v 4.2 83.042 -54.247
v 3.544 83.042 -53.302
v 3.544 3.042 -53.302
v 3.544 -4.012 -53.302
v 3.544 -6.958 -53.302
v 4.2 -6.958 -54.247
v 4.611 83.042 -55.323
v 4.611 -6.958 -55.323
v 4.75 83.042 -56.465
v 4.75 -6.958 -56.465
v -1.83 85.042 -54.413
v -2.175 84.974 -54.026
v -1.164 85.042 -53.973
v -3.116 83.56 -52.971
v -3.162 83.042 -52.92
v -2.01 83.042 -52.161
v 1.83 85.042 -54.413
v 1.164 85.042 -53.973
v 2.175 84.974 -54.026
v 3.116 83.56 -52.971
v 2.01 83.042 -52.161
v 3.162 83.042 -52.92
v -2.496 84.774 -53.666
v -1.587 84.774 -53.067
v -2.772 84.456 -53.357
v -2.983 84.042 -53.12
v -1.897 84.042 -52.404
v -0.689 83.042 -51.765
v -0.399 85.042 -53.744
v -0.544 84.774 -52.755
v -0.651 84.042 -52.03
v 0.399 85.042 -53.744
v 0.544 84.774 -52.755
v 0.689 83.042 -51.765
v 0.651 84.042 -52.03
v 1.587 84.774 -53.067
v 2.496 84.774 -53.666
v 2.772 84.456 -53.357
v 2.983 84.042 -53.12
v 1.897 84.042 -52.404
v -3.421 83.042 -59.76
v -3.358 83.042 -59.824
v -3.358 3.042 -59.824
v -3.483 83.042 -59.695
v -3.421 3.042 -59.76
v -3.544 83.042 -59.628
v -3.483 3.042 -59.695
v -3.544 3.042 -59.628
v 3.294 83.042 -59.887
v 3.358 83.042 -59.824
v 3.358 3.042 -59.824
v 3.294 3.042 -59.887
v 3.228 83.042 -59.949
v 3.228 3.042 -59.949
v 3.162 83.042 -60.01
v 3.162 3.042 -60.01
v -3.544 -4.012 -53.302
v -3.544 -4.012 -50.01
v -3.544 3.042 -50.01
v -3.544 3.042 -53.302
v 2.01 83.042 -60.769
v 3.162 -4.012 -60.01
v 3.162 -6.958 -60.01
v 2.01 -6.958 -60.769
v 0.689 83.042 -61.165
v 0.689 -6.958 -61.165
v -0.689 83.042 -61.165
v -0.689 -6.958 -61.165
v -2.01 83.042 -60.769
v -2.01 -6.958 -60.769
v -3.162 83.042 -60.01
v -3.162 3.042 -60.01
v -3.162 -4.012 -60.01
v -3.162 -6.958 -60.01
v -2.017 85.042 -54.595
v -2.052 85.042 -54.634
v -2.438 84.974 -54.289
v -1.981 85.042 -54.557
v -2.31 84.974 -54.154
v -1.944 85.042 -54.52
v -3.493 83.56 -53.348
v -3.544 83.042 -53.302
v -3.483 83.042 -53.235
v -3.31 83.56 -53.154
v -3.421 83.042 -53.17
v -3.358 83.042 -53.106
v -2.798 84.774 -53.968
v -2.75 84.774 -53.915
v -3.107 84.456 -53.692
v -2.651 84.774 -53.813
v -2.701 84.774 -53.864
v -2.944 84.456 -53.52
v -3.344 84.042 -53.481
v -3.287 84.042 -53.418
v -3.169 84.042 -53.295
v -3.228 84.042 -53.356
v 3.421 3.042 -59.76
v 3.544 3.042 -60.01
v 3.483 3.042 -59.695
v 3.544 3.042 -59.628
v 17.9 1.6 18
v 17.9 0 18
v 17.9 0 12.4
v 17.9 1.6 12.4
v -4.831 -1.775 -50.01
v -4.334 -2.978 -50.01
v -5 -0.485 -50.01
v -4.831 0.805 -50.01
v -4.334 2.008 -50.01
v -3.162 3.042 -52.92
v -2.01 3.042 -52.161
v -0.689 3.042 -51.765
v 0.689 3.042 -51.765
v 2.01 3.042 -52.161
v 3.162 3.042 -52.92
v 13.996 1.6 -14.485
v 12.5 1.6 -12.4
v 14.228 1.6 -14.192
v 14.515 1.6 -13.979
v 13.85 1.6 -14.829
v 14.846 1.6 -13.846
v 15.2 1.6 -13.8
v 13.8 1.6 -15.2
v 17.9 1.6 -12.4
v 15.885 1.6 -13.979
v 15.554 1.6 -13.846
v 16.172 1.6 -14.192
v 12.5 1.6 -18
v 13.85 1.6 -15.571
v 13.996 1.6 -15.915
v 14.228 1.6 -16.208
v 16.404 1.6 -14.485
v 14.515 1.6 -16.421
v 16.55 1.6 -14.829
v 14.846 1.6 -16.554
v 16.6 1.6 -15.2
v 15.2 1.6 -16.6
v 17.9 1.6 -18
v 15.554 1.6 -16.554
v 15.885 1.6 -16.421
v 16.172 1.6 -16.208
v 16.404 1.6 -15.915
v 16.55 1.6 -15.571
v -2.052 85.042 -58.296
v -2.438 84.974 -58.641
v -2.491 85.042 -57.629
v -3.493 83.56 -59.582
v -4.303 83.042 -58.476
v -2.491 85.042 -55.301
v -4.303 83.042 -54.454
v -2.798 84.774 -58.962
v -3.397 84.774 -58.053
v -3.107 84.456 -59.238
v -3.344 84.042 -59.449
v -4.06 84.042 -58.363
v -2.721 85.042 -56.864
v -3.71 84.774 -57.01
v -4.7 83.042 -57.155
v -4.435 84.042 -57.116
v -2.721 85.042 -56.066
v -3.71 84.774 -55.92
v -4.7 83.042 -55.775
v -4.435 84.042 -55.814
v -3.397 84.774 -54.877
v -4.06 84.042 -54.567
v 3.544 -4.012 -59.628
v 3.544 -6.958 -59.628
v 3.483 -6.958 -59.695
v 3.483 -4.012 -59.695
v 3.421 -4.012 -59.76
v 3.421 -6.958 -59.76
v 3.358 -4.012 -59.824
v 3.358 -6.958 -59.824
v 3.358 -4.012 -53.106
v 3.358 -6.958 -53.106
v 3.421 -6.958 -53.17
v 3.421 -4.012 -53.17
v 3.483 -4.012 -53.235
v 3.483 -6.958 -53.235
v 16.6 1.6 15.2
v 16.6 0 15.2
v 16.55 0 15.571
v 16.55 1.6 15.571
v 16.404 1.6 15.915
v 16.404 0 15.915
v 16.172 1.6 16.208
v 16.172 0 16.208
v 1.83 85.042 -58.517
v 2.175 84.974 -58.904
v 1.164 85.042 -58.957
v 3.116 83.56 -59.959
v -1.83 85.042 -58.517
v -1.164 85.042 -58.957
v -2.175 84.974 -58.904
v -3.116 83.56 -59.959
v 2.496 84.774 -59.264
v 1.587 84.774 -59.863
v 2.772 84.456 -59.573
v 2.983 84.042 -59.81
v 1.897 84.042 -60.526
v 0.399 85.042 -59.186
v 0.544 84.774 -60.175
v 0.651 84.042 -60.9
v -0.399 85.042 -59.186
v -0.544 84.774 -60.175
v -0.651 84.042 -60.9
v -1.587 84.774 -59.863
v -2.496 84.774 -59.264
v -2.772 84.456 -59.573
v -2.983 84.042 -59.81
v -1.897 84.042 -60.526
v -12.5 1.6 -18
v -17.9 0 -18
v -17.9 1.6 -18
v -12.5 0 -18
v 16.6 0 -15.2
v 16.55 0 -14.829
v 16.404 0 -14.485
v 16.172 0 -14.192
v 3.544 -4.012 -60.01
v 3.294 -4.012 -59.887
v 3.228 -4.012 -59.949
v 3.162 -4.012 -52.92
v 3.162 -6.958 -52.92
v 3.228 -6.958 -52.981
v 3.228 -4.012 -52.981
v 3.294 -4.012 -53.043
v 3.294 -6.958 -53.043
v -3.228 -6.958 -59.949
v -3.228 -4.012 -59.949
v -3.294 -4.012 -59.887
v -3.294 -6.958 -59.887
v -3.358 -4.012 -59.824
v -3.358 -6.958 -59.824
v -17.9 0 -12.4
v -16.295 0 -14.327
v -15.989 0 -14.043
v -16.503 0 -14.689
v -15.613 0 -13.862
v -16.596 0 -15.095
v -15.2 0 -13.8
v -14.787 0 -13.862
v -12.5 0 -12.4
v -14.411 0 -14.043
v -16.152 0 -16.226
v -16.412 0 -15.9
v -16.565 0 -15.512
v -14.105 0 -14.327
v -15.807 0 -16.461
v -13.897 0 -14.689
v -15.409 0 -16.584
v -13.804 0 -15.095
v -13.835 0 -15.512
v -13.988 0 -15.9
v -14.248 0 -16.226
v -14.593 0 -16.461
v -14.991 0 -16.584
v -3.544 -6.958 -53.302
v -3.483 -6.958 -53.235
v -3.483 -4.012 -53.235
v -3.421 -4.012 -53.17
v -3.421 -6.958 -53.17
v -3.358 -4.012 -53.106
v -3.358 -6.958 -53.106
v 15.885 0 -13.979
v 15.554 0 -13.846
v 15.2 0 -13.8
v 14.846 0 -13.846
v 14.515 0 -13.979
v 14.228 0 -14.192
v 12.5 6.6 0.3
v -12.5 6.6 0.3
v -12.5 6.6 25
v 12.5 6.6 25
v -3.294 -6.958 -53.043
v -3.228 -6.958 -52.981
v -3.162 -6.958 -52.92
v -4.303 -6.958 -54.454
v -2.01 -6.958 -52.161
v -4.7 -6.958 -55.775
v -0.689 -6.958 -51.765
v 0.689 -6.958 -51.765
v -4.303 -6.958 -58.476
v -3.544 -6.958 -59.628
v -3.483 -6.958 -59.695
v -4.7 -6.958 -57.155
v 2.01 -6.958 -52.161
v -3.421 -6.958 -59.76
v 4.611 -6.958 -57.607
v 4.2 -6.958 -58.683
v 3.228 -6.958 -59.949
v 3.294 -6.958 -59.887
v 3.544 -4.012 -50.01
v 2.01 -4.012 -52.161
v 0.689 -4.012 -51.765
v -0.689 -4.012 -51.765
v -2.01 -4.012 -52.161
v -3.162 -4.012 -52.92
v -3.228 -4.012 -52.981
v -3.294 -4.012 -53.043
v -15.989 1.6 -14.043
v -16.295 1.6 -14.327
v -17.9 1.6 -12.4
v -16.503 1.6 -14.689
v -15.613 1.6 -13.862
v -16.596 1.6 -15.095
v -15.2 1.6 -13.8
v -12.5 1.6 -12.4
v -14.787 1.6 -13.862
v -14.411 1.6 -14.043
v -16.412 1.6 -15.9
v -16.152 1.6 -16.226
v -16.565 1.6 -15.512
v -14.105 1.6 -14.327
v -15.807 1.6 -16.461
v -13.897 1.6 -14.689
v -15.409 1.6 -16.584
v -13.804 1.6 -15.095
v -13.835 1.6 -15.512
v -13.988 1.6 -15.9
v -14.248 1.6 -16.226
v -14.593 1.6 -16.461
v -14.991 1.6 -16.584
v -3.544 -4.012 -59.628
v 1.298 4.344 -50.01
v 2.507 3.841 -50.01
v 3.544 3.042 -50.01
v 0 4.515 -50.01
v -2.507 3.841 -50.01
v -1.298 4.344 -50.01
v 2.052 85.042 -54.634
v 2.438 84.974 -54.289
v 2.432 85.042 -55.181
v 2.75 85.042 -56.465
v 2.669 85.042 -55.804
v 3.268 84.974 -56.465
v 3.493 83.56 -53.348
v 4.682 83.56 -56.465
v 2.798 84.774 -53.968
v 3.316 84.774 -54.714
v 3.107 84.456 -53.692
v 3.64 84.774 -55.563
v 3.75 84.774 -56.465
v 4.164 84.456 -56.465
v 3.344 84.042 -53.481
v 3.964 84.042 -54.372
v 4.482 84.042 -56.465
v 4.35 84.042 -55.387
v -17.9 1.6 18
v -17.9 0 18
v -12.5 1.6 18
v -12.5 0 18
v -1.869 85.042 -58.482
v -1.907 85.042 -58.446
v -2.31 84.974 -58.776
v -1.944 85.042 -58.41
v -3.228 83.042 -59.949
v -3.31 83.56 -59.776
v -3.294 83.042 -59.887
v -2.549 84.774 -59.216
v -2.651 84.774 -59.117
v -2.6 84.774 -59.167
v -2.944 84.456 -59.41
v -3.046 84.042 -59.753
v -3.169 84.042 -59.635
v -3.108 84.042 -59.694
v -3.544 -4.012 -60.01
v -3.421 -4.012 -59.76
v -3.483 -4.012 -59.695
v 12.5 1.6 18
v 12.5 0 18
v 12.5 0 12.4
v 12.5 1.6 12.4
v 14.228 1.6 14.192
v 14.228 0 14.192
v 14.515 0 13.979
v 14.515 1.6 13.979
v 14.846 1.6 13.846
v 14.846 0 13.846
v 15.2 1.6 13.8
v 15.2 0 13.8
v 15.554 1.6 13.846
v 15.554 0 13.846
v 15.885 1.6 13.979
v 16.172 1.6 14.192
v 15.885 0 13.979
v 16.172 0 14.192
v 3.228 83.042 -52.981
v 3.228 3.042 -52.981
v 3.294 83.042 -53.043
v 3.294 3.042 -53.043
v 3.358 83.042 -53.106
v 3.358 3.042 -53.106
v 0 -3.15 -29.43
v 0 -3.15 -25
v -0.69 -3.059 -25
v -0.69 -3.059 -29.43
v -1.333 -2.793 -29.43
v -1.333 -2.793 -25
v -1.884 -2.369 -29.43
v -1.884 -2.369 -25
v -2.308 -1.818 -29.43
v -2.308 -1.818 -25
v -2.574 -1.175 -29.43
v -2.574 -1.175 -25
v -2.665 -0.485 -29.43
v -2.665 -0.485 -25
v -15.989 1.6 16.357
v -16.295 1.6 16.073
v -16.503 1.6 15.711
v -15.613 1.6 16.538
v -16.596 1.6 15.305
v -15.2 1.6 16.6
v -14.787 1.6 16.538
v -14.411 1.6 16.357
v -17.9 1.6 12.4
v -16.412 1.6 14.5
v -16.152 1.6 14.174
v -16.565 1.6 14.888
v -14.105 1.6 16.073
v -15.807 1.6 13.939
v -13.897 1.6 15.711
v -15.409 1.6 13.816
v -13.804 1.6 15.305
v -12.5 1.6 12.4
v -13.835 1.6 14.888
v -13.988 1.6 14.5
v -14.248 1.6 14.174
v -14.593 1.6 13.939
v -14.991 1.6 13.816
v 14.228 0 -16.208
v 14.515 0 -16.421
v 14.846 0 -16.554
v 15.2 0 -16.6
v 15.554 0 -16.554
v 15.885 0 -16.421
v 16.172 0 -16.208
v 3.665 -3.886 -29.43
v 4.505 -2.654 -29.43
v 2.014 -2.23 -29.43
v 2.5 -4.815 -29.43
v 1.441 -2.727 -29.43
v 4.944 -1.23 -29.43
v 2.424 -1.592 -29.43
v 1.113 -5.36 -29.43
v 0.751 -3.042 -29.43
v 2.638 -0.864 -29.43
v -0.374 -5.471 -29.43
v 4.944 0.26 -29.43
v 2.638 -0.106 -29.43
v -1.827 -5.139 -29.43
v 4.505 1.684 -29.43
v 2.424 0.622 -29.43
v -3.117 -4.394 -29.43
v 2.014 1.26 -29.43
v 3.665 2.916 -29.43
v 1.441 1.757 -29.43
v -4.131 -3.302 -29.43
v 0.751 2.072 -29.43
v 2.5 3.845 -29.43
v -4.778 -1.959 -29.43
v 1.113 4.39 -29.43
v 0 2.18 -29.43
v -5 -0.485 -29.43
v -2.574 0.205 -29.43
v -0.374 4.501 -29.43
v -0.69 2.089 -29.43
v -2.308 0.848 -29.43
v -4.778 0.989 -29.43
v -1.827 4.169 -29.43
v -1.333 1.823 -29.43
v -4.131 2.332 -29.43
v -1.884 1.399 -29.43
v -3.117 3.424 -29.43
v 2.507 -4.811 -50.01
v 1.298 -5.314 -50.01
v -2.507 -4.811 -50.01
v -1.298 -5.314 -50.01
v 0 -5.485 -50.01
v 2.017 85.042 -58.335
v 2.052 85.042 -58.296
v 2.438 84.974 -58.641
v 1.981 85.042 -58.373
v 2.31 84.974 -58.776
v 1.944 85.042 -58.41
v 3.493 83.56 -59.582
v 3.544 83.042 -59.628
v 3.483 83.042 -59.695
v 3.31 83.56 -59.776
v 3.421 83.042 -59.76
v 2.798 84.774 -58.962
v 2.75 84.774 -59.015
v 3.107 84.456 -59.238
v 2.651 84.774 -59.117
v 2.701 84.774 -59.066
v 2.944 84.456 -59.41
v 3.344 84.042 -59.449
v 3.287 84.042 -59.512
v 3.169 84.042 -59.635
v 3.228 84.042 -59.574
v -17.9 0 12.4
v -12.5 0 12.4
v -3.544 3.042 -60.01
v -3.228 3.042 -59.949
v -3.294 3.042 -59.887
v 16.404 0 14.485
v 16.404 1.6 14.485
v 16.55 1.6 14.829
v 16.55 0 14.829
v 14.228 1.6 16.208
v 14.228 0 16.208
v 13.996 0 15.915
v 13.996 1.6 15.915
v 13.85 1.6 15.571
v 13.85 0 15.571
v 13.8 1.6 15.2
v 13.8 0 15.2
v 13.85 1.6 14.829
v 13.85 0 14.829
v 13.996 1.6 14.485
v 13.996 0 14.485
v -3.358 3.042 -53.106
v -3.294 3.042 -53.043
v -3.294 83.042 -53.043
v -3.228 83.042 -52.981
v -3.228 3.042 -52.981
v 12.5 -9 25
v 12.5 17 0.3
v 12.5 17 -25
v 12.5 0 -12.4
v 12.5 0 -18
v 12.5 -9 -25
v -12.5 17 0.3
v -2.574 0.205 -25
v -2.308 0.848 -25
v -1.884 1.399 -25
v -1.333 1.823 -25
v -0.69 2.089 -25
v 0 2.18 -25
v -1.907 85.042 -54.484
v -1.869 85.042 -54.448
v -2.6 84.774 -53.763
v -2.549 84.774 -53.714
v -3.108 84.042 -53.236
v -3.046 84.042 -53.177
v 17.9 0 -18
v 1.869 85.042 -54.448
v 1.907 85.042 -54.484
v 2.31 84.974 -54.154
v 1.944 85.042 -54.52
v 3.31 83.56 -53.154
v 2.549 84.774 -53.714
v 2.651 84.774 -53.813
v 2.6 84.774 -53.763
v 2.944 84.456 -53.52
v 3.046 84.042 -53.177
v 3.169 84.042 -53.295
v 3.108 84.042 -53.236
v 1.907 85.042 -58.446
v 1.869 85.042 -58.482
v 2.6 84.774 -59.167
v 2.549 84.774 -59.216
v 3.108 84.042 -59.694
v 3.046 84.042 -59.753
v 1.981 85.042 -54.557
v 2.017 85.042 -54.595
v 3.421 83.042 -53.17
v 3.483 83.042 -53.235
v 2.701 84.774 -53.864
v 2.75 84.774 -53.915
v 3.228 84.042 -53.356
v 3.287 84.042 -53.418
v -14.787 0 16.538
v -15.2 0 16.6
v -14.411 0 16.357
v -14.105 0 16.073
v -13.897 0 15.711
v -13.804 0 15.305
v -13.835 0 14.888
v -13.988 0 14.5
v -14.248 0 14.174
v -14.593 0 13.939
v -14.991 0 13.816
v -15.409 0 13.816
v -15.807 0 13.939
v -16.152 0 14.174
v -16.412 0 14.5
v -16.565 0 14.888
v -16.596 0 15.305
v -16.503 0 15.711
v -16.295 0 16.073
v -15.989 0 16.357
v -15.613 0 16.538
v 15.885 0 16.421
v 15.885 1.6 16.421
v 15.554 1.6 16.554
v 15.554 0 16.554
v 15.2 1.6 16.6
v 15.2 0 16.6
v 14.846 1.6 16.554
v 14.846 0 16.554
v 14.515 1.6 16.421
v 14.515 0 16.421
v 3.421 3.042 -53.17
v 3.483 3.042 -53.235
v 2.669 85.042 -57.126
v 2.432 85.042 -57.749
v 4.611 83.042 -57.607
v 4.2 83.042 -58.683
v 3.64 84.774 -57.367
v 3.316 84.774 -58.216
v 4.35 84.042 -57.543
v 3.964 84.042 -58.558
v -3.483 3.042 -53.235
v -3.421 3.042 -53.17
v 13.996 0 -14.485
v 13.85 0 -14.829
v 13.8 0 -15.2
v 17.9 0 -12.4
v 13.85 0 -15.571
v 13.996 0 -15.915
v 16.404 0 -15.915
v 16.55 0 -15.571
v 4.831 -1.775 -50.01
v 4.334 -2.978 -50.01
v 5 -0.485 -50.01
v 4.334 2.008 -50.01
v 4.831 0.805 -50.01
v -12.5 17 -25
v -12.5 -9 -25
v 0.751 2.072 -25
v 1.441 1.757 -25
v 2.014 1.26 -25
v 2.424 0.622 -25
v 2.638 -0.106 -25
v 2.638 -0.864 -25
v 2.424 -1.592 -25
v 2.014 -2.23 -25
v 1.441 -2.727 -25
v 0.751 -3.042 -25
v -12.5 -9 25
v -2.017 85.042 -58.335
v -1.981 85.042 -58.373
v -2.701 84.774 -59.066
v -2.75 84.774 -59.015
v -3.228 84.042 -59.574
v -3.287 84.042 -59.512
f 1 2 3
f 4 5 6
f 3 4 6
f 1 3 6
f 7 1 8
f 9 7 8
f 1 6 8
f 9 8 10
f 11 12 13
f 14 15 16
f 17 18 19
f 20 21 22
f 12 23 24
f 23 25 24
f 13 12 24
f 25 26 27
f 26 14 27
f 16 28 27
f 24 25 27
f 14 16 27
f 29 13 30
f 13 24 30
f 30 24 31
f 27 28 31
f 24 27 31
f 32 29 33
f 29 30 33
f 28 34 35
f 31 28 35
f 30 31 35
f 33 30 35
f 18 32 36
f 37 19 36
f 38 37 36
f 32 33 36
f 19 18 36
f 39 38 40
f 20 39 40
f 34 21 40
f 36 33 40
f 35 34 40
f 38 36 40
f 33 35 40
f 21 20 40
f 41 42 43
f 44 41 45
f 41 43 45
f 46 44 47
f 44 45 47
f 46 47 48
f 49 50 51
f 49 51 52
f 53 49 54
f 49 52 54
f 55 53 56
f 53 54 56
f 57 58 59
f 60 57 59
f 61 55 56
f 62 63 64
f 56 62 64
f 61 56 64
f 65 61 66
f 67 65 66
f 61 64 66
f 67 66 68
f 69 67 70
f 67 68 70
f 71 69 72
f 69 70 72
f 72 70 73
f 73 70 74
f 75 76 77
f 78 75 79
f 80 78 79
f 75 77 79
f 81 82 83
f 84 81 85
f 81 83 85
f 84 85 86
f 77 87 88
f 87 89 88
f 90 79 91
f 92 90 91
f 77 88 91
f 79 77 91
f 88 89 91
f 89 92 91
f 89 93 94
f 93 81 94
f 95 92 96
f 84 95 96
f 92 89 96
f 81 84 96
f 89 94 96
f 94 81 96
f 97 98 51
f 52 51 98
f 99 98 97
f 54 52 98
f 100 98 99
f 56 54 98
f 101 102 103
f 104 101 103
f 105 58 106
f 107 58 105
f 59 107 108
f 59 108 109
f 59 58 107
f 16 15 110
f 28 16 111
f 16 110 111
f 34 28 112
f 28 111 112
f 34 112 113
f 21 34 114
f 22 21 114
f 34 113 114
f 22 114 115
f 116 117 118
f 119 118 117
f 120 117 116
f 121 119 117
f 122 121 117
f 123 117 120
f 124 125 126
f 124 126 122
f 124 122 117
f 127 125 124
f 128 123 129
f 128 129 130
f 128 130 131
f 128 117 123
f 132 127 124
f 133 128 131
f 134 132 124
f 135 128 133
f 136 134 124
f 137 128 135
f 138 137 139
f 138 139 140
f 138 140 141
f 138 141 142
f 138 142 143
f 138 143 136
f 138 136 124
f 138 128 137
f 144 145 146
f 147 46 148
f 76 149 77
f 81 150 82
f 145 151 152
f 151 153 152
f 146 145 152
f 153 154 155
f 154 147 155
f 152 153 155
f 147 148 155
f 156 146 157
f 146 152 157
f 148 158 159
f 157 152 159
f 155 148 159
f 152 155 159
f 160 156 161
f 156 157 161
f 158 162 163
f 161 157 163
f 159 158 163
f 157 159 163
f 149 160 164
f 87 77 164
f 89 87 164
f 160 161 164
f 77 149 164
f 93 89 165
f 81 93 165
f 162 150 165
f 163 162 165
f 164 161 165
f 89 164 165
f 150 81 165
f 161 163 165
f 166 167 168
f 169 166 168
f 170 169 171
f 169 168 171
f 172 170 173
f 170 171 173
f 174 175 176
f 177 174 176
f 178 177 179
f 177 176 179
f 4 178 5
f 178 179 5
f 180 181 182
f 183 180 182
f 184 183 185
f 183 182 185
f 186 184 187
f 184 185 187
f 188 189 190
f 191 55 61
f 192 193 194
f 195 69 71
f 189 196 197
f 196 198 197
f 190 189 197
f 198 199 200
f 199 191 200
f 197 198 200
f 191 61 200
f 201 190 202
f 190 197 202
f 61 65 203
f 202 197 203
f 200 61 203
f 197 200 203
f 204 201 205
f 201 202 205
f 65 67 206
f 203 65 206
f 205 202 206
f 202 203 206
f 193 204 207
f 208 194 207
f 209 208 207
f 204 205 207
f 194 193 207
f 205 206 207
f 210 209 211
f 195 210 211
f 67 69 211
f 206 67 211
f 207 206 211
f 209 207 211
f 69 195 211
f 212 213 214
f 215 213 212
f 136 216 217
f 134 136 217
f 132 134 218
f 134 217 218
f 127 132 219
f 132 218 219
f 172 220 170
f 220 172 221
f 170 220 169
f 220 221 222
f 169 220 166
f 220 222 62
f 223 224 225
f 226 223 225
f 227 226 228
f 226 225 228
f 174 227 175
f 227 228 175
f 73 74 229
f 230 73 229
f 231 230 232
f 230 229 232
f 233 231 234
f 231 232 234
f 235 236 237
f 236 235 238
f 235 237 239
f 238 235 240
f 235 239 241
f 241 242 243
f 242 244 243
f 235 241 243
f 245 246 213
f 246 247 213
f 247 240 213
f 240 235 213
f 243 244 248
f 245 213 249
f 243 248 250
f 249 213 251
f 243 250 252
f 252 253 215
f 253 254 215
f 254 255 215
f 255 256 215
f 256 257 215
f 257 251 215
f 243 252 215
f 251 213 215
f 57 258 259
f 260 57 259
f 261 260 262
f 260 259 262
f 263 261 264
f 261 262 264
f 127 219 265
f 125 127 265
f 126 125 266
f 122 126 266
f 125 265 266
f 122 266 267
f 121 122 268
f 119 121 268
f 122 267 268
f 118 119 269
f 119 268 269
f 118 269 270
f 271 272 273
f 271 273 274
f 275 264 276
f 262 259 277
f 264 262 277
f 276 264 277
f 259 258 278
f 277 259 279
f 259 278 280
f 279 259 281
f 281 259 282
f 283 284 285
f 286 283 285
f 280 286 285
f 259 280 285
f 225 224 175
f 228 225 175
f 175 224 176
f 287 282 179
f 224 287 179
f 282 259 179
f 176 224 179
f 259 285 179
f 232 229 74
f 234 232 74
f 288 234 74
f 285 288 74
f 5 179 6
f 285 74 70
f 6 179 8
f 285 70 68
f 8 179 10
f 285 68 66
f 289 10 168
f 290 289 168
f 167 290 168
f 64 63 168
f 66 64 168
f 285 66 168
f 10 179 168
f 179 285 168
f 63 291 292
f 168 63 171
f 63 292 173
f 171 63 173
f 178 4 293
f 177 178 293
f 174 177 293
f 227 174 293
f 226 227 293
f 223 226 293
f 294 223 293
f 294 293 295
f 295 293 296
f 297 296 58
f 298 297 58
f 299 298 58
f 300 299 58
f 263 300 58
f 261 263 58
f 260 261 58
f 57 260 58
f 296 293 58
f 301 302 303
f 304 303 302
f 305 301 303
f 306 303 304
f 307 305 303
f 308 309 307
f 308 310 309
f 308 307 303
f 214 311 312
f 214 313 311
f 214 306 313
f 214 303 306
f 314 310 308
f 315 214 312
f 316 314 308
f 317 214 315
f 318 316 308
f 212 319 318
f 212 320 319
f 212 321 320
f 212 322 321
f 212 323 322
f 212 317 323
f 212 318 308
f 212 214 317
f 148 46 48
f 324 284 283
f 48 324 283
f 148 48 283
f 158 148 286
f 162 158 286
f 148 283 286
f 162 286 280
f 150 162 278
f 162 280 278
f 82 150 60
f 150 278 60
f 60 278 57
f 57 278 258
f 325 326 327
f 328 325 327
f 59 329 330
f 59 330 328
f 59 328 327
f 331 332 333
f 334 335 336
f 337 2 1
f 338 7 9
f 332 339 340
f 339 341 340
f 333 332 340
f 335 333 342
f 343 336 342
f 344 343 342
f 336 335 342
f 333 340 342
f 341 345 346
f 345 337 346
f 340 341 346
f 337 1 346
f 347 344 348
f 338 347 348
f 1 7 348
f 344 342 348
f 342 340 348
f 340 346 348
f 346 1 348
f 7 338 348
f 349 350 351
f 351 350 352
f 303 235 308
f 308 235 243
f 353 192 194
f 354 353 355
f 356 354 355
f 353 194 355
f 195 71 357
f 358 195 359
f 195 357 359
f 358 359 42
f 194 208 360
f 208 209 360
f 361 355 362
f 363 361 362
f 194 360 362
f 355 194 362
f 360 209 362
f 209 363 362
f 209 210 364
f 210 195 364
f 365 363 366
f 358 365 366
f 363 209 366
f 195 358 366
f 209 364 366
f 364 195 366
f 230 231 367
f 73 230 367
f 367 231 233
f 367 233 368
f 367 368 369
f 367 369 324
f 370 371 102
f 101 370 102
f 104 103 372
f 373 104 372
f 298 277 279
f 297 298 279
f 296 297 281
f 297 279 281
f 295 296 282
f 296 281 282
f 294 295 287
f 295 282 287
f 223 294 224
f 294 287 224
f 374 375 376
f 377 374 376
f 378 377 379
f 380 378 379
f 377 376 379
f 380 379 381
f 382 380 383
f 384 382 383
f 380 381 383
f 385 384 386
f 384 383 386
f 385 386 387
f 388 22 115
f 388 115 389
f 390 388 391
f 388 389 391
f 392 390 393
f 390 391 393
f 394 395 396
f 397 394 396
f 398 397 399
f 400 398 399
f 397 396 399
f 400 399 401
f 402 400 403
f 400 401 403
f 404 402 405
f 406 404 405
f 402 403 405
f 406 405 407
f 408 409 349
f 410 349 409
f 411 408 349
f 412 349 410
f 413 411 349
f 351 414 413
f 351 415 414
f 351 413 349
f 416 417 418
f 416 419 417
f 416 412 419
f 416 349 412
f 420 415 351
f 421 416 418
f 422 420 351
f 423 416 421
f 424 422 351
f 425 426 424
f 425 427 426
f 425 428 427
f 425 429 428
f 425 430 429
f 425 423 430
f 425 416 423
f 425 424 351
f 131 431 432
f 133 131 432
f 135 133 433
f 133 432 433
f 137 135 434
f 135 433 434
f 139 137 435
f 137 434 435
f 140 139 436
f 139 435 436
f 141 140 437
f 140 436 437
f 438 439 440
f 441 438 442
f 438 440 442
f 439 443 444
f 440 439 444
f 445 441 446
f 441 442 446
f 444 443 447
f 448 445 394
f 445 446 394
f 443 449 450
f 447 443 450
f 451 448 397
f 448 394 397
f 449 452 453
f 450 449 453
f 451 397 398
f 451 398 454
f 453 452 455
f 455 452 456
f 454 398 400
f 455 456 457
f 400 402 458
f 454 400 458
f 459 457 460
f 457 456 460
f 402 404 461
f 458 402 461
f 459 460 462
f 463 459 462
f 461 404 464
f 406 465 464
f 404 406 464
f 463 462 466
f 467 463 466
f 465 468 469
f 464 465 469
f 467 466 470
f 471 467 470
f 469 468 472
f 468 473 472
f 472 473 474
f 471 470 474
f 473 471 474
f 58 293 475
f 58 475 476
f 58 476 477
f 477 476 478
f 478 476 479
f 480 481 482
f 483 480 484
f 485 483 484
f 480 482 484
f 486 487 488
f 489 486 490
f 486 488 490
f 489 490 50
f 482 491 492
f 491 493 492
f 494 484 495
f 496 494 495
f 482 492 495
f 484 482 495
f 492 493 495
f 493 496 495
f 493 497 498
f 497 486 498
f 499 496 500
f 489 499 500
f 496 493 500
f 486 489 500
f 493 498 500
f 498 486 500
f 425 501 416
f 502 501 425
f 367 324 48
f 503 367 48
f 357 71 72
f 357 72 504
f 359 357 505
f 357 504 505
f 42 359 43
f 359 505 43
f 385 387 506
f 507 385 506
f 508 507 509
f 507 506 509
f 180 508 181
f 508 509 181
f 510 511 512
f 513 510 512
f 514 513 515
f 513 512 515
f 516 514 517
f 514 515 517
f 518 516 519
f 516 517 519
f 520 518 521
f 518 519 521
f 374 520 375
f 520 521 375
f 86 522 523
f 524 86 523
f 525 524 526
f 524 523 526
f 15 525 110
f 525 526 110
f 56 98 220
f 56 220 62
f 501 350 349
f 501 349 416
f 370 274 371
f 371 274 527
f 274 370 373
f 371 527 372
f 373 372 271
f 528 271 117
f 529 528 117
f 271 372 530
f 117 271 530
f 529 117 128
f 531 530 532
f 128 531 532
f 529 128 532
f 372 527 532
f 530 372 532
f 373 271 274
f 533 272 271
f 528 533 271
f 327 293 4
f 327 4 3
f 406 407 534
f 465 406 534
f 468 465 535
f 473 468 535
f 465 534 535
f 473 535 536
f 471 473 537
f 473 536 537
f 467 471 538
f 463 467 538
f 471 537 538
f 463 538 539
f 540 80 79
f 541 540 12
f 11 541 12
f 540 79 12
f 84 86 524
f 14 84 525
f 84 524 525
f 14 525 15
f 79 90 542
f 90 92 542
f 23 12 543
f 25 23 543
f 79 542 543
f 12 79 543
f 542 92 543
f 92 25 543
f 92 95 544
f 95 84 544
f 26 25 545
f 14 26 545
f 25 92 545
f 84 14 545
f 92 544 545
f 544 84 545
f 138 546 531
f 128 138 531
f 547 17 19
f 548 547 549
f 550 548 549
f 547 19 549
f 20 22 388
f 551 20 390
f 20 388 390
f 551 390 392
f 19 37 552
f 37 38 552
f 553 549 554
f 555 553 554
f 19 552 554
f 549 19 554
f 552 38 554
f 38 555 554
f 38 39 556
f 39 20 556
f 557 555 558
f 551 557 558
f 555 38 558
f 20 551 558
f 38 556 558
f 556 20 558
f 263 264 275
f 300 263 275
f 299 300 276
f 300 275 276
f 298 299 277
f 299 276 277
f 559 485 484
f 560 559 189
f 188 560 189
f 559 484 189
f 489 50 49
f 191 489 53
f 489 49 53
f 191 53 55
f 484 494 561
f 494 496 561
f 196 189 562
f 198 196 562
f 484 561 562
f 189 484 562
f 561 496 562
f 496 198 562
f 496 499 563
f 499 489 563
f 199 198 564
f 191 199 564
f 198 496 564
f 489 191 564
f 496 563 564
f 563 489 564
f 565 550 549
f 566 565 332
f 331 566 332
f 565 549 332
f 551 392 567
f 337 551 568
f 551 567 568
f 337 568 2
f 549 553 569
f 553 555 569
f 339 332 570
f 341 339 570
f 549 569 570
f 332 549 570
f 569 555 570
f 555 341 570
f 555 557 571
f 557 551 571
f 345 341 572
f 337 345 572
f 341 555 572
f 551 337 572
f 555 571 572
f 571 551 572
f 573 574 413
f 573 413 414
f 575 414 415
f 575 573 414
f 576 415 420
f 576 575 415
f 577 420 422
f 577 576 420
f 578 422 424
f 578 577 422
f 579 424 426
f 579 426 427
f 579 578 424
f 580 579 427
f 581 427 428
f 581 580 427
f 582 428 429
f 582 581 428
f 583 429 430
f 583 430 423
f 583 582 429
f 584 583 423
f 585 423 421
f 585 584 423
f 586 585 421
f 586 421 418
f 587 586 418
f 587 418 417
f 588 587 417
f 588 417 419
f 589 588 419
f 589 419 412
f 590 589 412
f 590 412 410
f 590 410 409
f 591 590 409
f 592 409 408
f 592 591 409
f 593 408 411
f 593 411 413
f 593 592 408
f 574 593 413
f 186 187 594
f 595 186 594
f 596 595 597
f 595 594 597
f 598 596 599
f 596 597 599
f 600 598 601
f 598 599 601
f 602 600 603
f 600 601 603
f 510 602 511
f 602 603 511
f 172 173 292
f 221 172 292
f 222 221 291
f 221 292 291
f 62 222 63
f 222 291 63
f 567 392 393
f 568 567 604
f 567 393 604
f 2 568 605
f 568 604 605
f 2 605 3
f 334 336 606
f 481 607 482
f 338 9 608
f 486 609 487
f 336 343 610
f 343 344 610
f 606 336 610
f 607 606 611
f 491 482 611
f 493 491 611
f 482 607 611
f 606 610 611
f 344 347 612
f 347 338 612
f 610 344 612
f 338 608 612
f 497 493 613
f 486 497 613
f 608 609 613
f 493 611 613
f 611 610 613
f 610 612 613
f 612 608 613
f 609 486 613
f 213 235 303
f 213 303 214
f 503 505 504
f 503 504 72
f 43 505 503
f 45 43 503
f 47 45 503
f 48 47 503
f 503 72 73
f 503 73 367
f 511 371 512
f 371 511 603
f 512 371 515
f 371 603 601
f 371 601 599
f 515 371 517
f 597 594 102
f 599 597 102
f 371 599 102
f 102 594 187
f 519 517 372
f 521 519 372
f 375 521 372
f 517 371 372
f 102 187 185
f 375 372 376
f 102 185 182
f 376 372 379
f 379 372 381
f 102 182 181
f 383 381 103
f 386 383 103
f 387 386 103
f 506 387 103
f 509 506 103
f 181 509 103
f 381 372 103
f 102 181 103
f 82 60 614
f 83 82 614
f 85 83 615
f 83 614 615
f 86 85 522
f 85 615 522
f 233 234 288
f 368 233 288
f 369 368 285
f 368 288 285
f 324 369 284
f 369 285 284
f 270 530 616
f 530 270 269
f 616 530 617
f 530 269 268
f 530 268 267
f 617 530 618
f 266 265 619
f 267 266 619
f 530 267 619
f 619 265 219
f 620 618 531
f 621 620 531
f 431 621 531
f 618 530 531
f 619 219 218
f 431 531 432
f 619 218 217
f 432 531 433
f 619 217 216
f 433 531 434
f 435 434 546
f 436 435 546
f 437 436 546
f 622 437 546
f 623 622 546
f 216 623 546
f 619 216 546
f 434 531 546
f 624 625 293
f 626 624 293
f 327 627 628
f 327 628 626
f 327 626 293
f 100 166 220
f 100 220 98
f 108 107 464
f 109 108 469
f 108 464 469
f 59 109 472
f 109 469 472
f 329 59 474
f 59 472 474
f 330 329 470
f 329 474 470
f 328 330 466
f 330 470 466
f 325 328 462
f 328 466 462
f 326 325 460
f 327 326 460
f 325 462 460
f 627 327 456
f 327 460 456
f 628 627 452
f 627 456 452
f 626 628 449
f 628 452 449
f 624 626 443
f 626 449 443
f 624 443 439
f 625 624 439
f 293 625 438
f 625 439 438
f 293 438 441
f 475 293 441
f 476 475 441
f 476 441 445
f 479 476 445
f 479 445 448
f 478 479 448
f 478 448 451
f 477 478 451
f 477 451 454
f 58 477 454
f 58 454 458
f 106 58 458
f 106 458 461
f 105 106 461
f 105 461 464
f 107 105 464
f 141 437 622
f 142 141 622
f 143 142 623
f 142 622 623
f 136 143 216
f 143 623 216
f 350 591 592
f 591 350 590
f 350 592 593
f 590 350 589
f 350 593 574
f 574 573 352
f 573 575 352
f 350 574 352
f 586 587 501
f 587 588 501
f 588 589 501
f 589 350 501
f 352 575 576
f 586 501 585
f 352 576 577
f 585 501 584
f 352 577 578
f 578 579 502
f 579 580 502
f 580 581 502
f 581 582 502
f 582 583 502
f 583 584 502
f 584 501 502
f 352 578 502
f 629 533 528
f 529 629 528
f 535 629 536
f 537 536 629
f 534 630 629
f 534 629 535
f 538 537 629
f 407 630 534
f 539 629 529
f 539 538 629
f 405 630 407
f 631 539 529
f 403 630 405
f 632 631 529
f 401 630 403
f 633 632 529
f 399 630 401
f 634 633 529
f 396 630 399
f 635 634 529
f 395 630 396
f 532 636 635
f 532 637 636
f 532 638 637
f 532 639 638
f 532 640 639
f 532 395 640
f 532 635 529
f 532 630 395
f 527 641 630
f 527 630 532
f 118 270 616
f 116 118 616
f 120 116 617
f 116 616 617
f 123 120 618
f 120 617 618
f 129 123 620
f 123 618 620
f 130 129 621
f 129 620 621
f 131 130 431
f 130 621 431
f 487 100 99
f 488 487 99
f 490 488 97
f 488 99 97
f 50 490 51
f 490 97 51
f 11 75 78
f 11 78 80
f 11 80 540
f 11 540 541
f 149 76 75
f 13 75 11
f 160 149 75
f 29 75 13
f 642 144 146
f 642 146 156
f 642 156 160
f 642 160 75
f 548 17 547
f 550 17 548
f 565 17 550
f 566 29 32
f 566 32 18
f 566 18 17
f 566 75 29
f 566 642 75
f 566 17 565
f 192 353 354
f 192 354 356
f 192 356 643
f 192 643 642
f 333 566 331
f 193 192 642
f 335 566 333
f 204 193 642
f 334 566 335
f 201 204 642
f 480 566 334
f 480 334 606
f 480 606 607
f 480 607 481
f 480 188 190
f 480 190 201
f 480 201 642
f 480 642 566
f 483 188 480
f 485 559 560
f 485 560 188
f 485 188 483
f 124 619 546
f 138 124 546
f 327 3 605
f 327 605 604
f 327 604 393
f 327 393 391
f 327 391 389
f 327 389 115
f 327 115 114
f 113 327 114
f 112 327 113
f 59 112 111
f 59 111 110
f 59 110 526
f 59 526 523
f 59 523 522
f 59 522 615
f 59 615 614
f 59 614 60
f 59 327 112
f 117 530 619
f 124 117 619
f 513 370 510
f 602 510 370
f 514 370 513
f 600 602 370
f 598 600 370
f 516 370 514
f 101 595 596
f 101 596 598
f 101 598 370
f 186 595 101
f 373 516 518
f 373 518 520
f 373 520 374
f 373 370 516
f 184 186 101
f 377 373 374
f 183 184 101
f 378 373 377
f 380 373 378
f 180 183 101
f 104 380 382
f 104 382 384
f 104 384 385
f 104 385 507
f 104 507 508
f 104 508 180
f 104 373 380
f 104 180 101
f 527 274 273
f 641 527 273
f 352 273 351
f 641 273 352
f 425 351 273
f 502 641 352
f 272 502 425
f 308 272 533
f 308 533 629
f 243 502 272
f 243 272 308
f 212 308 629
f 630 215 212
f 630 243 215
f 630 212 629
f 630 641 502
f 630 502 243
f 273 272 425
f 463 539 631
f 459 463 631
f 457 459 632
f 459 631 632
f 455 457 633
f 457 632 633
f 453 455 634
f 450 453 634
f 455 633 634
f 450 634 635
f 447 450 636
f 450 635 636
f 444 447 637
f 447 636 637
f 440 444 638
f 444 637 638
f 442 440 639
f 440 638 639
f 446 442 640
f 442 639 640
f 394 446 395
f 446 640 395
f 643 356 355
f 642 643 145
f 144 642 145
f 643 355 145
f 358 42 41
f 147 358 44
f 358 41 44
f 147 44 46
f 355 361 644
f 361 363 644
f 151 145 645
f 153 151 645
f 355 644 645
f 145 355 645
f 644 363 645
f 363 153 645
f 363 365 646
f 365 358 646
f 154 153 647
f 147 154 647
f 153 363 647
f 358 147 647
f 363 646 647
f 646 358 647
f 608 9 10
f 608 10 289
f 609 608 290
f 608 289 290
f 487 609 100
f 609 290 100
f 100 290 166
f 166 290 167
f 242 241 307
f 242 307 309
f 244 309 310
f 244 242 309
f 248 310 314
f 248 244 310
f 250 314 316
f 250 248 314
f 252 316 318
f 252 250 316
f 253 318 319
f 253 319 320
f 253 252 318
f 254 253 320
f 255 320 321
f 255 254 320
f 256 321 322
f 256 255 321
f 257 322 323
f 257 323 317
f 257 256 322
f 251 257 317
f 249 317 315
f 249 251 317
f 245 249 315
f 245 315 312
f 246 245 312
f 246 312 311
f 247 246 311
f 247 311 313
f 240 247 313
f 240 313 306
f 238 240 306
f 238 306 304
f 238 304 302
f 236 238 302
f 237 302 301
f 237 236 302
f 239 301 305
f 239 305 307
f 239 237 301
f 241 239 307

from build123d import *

# Parameters (mm, degrees)
SKETCH_1_W           = 5.4
SKETCH_1_H           = 5.6
SKETCH_1_R           = 1.4
EXTRUDE_1_DEPTH      = 1.6
EXTRUDE_2_DEPTH      = 5
EXTRUDE_3_DEPTH      = 9
SKETCH_5_W           = 25
SKETCH_5_H           = 25.3
EXTRUDE_4_DEPTH      = 10.4
EXTRUDE_5_DEPTH      = 4.43
SKETCH_7_R           = 5
EXTRUDE_6_DEPTH      = 20.58
SKETCH_8_W           = 7.087670288
SKETCH_8_H           = 7.054426262
EXTRUDE_7_DEPTH      = 10
EXTRUDE_8_DEPTH      = 82
EXTRUDE_8_DEPTH_BACK = 10
FILLET_1_R           = 2


with BuildPart() as part:
    # 草图1 → 凸台-拉伸1 (new body)
    # profile 1 of 12: a face of its own
    with BuildSketch(Plane(origin=(0, 0, 0), x_dir=(1, 0, 0), z_dir=(0, 1, 0))):
        Polygon((0, -25), (0, 25), (-12.5, 25), (-12.5, 18), (-12.5, 12.4), (-12.5, -12.4), (-12.5, -18), (-12.5, -25), align=None)
    # profile 2 of 12: a face of its own
    with BuildSketch(Plane(origin=(0, 0, 0), x_dir=(1, 0, 0), z_dir=(0, 1, 0))):
        Polygon((12.5, 18), (12.5, 25), (0, 25), (0, -25), (12.5, -25), (12.5, -18), (12.5, -12.4), (12.5, 12.4), align=None)
    # profile 3 of 12: a face of its own
    with BuildSketch(Plane(origin=(0, 0, 0), x_dir=(1, 0, 0), z_dir=(0, 1, 0))):
        with Locations((-15.2, -15.2)):
            Rectangle(SKETCH_1_W, SKETCH_1_H)
        with Locations(Location((-15.2, -15.2, 0), (0, 0, 270))):
            Circle(SKETCH_1_R, mode=Mode.SUBTRACT)
    # profile 4 of 12: a face of its own
    with BuildSketch(Plane(origin=(0, 0, 0), x_dir=(1, 0, 0), z_dir=(0, 1, 0))):
        with Locations((-15.2, 15.2)):
            Rectangle(SKETCH_1_W, SKETCH_1_H)
        with Locations(Location((-15.2, 15.2, 0), (0, 0, 270))):
            Circle(SKETCH_1_R, mode=Mode.SUBTRACT)
    # profile 5 of 12: a face of its own
    with BuildSketch(Plane(origin=(0, 0, 0), x_dir=(1, 0, 0), z_dir=(0, 1, 0))):
        with BuildLine():
            Line((14.228210201, 14.192217986), (12.5, 12.4))
            Line((12.5, 12.4), (17.9, 12.4))
            Line((17.9, 12.4), (16.171789799, 14.192217986))
            ThreePointArc((16.171789799, 14.192217986), (15.2, 13.8), (14.228210201, 14.192217986))
        make_face()
    # profile 6 of 12: a face of its own
    with BuildSketch(Plane(origin=(0, 0, 0), x_dir=(1, 0, 0), z_dir=(0, 1, 0))):
        with BuildLine():
            Line((17.9, 18), (12.5, 18))
            Line((12.5, 18), (14.228210201, 16.207782014))
            ThreePointArc((14.228210201, 16.207782014), (15.2, 16.6), (16.171789799, 16.207782014))
            Line((16.171789799, 16.207782014), (17.9, 18))
        make_face()
    # profile 7 of 12: a face of its own
    with BuildSketch(Plane(origin=(0, 0, 0), x_dir=(1, 0, 0), z_dir=(0, 1, 0))):
        with BuildLine():
            Line((17.9, 12.4), (17.9, 18))
            Line((17.9, 18), (16.171789799, 16.207782014))
            ThreePointArc((16.171789799, 16.207782014), (16.488507997, 15.747491681), (16.6, 15.2))
            ThreePointArc((16.6, 15.2), (16.488507997, 14.652508319), (16.171789799, 14.192217986))
            Line((16.171789799, 14.192217986), (17.9, 12.4))
        make_face()
    # profile 8 of 12: a face of its own
    with BuildSketch(Plane(origin=(0, 0, 0), x_dir=(1, 0, 0), z_dir=(0, 1, 0))):
        with BuildLine():
            Line((14.228210201, 16.207782014), (12.5, 18))
            Line((12.5, 18), (12.5, 12.4))
            Line((12.5, 12.4), (14.228210201, 14.192217986))
            ThreePointArc((14.228210201, 14.192217986), (13.8, 15.2), (14.228210201, 16.207782014))
        make_face()
    # profile 9 of 12: a face of its own
    with BuildSketch(Plane(origin=(0, 0, 0), x_dir=(1, 0, 0), z_dir=(0, 1, 0))):
        with BuildLine():
            Line((17.9, -12.4), (12.5, -12.4))
            Line((12.5, -12.4), (14.228210201, -14.192217986))
            ThreePointArc((14.228210201, -14.192217986), (15.2, -13.8), (16.171789799, -14.192217986))
            Line((16.171789799, -14.192217986), (17.9, -12.4))
        make_face()
    # profile 10 of 12: a face of its own
    with BuildSketch(Plane(origin=(0, 0, 0), x_dir=(1, 0, 0), z_dir=(0, 1, 0))):
        with BuildLine():
            Line((14.228210201, -14.192217986), (12.5, -12.4))
            Line((12.5, -12.4), (12.5, -18))
            Line((12.5, -18), (14.228210201, -16.207782014))
            ThreePointArc((14.228210201, -16.207782014), (13.8, -15.2), (14.228210201, -14.192217986))
        make_face()
    # profile 11 of 12: a face of its own
    with BuildSketch(Plane(origin=(0, 0, 0), x_dir=(1, 0, 0), z_dir=(0, 1, 0))):
        with BuildLine():
            Line((17.9, -18), (17.9, -12.4))
            Line((17.9, -12.4), (16.171789799, -14.192217986))
            ThreePointArc((16.171789799, -14.192217986), (16.488507997, -14.652508319), (16.6, -15.2))
            ThreePointArc((16.6, -15.2), (16.488507997, -15.747491681), (16.171789799, -16.207782014))
            Line((16.171789799, -16.207782014), (17.9, -18))
        make_face()
    # profile 12 of 12: a face of its own
    with BuildSketch(Plane(origin=(0, 0, 0), x_dir=(1, 0, 0), z_dir=(0, 1, 0))):
        with BuildLine():
            Line((14.228210201, -16.207782014), (12.5, -18))
            Line((12.5, -18), (17.9, -18))
            Line((17.9, -18), (16.171789799, -16.207782014))
            ThreePointArc((16.171789799, -16.207782014), (15.2, -16.6), (14.228210201, -16.207782014))
        make_face()
    extrude(amount=EXTRUDE_1_DEPTH)

    # 草图3 → 凸台-拉伸2 (add)
    with BuildSketch(Plane(origin=(0, 1.6, 0), x_dir=(1, 0, 0), z_dir=(0, 1, 0))):
        Polygon((12.5, 25), (-12.5, 25), (-12.5, 18), (-12.5, 12.4), (-12.5, -12.4), (-12.5, -18), (-12.5, -25), (12.5, -25), (12.5, -18), (12.5, -12.4), (12.5, 12.4), (12.5, 18), align=None)
    extrude(amount=EXTRUDE_2_DEPTH)

    # 草图4 → 凸台-拉伸3 (add)
    with BuildSketch(Plane.XZ):
        Polygon((12.5, 25), (-12.5, 25), (-12.5, 18), (-12.5, 12.4), (-12.5, -12.4), (-12.5, -18), (-12.5, -25), (12.5, -25), (12.5, -18), (12.5, -12.4), (12.5, 12.4), (12.5, 18), align=None)
    extrude(amount=EXTRUDE_3_DEPTH)

    # 草图5 → 凸台-拉伸4 (add)
    with BuildSketch(Plane(origin=(0, 6.6, 0), x_dir=(1, 0, 0), z_dir=(0, 1, 0))):
        with Locations((0, 12.35)):
            Rectangle(SKETCH_5_W, SKETCH_5_H)
    extrude(amount=EXTRUDE_4_DEPTH)

    # 草图6 → 凸台-拉伸5 (add)
    with BuildSketch(Plane(origin=(0, 0, -25), x_dir=(-1, 0, 0), z_dir=(0, 0, -1))):
        with BuildLine():
            ThreePointArc((0, 2.18), (-2.665, -0.485), (0, -3.15))
            Line((0, -3.15), (0, 2.18))
        make_face()
        with BuildLine():
            Line((0, 2.18), (0, -3.15))
            ThreePointArc((0, -3.15), (1.884439572, -2.369439572), (2.665, -0.485))
            ThreePointArc((2.665, -0.485), (1.884439572, 1.399439572), (0, 2.18))
        make_face()
    extrude(amount=EXTRUDE_5_DEPTH)

    # 草图7 → 凸台-拉伸6 (add)
    with BuildSketch(Plane(origin=(0, 0, -29.43), x_dir=(-1, 0, 0), z_dir=(0, 0, -1))):
        with Locations((0, -0.485)):
            Circle(SKETCH_7_R)
    extrude(amount=EXTRUDE_6_DEPTH)

    # 草图8 → 凸台-拉伸7 (add)
    with BuildSketch(Plane(origin=(0, 0, -50.01), x_dir=(-1, 0, 0), z_dir=(0, 0, -1))):
        with Locations((0, -0.485)):
            Rectangle(SKETCH_8_W, SKETCH_8_H)
    extrude(amount=EXTRUDE_7_DEPTH)

    # 草图9 → 凸台-拉伸8 (add, two sides: drawn at the far end of the back side and taken through both)
    with BuildSketch(Plane(origin=(0, 3.042213131, 0), x_dir=(1, 0, 0), z_dir=(0, 1, 0)).offset(-EXTRUDE_8_DEPTH_BACK)):
        with BuildLine():
            Line((3.543835144, 59.627867761), (3.543835144, 53.302132239))
            ThreePointArc((3.543835144, 53.302132239), (4.438226951, 54.772474806), (4.75, 56.465))
            ThreePointArc((4.75, 56.465), (4.438226951, 58.157525194), (3.543835144, 59.627867761))
        make_face()
        with BuildLine():
            ThreePointArc((3.161562114, 60.01), (0, 61.215), (-3.161562114, 60.01))
            Line((-3.161562114, 60.01), (3.161562114, 60.01))
        make_face()
        with BuildLine():
            Line((-3.543835144, 53.302132239), (-3.543835144, 59.627867761))
            ThreePointArc((-3.543835144, 59.627867761), (-4.75, 56.465), (-3.543835144, 53.302132239))
        make_face()
        with BuildLine():
            ThreePointArc((-3.161562114, 52.92), (0, 51.715), (3.161562114, 52.92))
            Line((3.161562114, 52.92), (-3.161562114, 52.92))
        make_face()
        with BuildLine():
            Line((3.358205246, 53.105690915), (0, 56.465))
            Line((0, 56.465), (-3.358205246, 53.105690915))
            ThreePointArc((-3.358205246, 53.105690915), (-3.261205588, 53.011445582), (-3.161562114, 52.92))
            Line((-3.161562114, 52.92), (3.161562114, 52.92))
            ThreePointArc((3.161562114, 52.92), (3.261205588, 53.011445582), (3.358205246, 53.105690915))
        make_face()
        with BuildLine():
            Line((0, 56.465), (-3.358205246, 59.824309085))
            ThreePointArc((-3.358205246, 59.824309085), (-3.452417658, 59.727408974), (-3.543835144, 59.627867761))
            Line((-3.543835144, 59.627867761), (-3.543835144, 53.302132239))
            ThreePointArc((-3.543835144, 53.302132239), (-3.452417658, 53.202591026), (-3.358205246, 53.105690915))
            Line((-3.358205246, 53.105690915), (0, 56.465))
        make_face()
        with BuildLine():
            ThreePointArc((-3.161562114, 60.01), (-3.261205588, 59.918554418), (-3.358205246, 59.824309085))
            Line((-3.358205246, 59.824309085), (0, 56.465))
            Line((0, 56.465), (3.358205246, 59.824309085))
            ThreePointArc((3.358205246, 59.824309085), (3.261205588, 59.918554418), (3.161562114, 60.01))
            Line((3.161562114, 60.01), (-3.161562114, 60.01))
        make_face()
        with BuildLine():
            Line((3.358205246, 59.824309085), (0, 56.465))
            Line((0, 56.465), (3.358205246, 53.105690915))
            ThreePointArc((3.358205246, 53.105690915), (3.452417658, 53.202591026), (3.543835144, 53.302132239))
            Line((3.543835144, 53.302132239), (3.543835144, 59.627867761))
            ThreePointArc((3.543835144, 59.627867761), (3.452417658, 59.727408974), (3.358205246, 59.824309085))
        make_face()
    extrude(amount=EXTRUDE_8_DEPTH + EXTRUDE_8_DEPTH_BACK)

    # 圆角1
    fillet_1_edges = [part.edges().sort_by_distance(p)[0] for p in [
        (-3.359309085, 85.042213131, -53.106794754),
    ]]
    fillet(fillet_1_edges, radius=FILLET_1_R)


solid = part.part
